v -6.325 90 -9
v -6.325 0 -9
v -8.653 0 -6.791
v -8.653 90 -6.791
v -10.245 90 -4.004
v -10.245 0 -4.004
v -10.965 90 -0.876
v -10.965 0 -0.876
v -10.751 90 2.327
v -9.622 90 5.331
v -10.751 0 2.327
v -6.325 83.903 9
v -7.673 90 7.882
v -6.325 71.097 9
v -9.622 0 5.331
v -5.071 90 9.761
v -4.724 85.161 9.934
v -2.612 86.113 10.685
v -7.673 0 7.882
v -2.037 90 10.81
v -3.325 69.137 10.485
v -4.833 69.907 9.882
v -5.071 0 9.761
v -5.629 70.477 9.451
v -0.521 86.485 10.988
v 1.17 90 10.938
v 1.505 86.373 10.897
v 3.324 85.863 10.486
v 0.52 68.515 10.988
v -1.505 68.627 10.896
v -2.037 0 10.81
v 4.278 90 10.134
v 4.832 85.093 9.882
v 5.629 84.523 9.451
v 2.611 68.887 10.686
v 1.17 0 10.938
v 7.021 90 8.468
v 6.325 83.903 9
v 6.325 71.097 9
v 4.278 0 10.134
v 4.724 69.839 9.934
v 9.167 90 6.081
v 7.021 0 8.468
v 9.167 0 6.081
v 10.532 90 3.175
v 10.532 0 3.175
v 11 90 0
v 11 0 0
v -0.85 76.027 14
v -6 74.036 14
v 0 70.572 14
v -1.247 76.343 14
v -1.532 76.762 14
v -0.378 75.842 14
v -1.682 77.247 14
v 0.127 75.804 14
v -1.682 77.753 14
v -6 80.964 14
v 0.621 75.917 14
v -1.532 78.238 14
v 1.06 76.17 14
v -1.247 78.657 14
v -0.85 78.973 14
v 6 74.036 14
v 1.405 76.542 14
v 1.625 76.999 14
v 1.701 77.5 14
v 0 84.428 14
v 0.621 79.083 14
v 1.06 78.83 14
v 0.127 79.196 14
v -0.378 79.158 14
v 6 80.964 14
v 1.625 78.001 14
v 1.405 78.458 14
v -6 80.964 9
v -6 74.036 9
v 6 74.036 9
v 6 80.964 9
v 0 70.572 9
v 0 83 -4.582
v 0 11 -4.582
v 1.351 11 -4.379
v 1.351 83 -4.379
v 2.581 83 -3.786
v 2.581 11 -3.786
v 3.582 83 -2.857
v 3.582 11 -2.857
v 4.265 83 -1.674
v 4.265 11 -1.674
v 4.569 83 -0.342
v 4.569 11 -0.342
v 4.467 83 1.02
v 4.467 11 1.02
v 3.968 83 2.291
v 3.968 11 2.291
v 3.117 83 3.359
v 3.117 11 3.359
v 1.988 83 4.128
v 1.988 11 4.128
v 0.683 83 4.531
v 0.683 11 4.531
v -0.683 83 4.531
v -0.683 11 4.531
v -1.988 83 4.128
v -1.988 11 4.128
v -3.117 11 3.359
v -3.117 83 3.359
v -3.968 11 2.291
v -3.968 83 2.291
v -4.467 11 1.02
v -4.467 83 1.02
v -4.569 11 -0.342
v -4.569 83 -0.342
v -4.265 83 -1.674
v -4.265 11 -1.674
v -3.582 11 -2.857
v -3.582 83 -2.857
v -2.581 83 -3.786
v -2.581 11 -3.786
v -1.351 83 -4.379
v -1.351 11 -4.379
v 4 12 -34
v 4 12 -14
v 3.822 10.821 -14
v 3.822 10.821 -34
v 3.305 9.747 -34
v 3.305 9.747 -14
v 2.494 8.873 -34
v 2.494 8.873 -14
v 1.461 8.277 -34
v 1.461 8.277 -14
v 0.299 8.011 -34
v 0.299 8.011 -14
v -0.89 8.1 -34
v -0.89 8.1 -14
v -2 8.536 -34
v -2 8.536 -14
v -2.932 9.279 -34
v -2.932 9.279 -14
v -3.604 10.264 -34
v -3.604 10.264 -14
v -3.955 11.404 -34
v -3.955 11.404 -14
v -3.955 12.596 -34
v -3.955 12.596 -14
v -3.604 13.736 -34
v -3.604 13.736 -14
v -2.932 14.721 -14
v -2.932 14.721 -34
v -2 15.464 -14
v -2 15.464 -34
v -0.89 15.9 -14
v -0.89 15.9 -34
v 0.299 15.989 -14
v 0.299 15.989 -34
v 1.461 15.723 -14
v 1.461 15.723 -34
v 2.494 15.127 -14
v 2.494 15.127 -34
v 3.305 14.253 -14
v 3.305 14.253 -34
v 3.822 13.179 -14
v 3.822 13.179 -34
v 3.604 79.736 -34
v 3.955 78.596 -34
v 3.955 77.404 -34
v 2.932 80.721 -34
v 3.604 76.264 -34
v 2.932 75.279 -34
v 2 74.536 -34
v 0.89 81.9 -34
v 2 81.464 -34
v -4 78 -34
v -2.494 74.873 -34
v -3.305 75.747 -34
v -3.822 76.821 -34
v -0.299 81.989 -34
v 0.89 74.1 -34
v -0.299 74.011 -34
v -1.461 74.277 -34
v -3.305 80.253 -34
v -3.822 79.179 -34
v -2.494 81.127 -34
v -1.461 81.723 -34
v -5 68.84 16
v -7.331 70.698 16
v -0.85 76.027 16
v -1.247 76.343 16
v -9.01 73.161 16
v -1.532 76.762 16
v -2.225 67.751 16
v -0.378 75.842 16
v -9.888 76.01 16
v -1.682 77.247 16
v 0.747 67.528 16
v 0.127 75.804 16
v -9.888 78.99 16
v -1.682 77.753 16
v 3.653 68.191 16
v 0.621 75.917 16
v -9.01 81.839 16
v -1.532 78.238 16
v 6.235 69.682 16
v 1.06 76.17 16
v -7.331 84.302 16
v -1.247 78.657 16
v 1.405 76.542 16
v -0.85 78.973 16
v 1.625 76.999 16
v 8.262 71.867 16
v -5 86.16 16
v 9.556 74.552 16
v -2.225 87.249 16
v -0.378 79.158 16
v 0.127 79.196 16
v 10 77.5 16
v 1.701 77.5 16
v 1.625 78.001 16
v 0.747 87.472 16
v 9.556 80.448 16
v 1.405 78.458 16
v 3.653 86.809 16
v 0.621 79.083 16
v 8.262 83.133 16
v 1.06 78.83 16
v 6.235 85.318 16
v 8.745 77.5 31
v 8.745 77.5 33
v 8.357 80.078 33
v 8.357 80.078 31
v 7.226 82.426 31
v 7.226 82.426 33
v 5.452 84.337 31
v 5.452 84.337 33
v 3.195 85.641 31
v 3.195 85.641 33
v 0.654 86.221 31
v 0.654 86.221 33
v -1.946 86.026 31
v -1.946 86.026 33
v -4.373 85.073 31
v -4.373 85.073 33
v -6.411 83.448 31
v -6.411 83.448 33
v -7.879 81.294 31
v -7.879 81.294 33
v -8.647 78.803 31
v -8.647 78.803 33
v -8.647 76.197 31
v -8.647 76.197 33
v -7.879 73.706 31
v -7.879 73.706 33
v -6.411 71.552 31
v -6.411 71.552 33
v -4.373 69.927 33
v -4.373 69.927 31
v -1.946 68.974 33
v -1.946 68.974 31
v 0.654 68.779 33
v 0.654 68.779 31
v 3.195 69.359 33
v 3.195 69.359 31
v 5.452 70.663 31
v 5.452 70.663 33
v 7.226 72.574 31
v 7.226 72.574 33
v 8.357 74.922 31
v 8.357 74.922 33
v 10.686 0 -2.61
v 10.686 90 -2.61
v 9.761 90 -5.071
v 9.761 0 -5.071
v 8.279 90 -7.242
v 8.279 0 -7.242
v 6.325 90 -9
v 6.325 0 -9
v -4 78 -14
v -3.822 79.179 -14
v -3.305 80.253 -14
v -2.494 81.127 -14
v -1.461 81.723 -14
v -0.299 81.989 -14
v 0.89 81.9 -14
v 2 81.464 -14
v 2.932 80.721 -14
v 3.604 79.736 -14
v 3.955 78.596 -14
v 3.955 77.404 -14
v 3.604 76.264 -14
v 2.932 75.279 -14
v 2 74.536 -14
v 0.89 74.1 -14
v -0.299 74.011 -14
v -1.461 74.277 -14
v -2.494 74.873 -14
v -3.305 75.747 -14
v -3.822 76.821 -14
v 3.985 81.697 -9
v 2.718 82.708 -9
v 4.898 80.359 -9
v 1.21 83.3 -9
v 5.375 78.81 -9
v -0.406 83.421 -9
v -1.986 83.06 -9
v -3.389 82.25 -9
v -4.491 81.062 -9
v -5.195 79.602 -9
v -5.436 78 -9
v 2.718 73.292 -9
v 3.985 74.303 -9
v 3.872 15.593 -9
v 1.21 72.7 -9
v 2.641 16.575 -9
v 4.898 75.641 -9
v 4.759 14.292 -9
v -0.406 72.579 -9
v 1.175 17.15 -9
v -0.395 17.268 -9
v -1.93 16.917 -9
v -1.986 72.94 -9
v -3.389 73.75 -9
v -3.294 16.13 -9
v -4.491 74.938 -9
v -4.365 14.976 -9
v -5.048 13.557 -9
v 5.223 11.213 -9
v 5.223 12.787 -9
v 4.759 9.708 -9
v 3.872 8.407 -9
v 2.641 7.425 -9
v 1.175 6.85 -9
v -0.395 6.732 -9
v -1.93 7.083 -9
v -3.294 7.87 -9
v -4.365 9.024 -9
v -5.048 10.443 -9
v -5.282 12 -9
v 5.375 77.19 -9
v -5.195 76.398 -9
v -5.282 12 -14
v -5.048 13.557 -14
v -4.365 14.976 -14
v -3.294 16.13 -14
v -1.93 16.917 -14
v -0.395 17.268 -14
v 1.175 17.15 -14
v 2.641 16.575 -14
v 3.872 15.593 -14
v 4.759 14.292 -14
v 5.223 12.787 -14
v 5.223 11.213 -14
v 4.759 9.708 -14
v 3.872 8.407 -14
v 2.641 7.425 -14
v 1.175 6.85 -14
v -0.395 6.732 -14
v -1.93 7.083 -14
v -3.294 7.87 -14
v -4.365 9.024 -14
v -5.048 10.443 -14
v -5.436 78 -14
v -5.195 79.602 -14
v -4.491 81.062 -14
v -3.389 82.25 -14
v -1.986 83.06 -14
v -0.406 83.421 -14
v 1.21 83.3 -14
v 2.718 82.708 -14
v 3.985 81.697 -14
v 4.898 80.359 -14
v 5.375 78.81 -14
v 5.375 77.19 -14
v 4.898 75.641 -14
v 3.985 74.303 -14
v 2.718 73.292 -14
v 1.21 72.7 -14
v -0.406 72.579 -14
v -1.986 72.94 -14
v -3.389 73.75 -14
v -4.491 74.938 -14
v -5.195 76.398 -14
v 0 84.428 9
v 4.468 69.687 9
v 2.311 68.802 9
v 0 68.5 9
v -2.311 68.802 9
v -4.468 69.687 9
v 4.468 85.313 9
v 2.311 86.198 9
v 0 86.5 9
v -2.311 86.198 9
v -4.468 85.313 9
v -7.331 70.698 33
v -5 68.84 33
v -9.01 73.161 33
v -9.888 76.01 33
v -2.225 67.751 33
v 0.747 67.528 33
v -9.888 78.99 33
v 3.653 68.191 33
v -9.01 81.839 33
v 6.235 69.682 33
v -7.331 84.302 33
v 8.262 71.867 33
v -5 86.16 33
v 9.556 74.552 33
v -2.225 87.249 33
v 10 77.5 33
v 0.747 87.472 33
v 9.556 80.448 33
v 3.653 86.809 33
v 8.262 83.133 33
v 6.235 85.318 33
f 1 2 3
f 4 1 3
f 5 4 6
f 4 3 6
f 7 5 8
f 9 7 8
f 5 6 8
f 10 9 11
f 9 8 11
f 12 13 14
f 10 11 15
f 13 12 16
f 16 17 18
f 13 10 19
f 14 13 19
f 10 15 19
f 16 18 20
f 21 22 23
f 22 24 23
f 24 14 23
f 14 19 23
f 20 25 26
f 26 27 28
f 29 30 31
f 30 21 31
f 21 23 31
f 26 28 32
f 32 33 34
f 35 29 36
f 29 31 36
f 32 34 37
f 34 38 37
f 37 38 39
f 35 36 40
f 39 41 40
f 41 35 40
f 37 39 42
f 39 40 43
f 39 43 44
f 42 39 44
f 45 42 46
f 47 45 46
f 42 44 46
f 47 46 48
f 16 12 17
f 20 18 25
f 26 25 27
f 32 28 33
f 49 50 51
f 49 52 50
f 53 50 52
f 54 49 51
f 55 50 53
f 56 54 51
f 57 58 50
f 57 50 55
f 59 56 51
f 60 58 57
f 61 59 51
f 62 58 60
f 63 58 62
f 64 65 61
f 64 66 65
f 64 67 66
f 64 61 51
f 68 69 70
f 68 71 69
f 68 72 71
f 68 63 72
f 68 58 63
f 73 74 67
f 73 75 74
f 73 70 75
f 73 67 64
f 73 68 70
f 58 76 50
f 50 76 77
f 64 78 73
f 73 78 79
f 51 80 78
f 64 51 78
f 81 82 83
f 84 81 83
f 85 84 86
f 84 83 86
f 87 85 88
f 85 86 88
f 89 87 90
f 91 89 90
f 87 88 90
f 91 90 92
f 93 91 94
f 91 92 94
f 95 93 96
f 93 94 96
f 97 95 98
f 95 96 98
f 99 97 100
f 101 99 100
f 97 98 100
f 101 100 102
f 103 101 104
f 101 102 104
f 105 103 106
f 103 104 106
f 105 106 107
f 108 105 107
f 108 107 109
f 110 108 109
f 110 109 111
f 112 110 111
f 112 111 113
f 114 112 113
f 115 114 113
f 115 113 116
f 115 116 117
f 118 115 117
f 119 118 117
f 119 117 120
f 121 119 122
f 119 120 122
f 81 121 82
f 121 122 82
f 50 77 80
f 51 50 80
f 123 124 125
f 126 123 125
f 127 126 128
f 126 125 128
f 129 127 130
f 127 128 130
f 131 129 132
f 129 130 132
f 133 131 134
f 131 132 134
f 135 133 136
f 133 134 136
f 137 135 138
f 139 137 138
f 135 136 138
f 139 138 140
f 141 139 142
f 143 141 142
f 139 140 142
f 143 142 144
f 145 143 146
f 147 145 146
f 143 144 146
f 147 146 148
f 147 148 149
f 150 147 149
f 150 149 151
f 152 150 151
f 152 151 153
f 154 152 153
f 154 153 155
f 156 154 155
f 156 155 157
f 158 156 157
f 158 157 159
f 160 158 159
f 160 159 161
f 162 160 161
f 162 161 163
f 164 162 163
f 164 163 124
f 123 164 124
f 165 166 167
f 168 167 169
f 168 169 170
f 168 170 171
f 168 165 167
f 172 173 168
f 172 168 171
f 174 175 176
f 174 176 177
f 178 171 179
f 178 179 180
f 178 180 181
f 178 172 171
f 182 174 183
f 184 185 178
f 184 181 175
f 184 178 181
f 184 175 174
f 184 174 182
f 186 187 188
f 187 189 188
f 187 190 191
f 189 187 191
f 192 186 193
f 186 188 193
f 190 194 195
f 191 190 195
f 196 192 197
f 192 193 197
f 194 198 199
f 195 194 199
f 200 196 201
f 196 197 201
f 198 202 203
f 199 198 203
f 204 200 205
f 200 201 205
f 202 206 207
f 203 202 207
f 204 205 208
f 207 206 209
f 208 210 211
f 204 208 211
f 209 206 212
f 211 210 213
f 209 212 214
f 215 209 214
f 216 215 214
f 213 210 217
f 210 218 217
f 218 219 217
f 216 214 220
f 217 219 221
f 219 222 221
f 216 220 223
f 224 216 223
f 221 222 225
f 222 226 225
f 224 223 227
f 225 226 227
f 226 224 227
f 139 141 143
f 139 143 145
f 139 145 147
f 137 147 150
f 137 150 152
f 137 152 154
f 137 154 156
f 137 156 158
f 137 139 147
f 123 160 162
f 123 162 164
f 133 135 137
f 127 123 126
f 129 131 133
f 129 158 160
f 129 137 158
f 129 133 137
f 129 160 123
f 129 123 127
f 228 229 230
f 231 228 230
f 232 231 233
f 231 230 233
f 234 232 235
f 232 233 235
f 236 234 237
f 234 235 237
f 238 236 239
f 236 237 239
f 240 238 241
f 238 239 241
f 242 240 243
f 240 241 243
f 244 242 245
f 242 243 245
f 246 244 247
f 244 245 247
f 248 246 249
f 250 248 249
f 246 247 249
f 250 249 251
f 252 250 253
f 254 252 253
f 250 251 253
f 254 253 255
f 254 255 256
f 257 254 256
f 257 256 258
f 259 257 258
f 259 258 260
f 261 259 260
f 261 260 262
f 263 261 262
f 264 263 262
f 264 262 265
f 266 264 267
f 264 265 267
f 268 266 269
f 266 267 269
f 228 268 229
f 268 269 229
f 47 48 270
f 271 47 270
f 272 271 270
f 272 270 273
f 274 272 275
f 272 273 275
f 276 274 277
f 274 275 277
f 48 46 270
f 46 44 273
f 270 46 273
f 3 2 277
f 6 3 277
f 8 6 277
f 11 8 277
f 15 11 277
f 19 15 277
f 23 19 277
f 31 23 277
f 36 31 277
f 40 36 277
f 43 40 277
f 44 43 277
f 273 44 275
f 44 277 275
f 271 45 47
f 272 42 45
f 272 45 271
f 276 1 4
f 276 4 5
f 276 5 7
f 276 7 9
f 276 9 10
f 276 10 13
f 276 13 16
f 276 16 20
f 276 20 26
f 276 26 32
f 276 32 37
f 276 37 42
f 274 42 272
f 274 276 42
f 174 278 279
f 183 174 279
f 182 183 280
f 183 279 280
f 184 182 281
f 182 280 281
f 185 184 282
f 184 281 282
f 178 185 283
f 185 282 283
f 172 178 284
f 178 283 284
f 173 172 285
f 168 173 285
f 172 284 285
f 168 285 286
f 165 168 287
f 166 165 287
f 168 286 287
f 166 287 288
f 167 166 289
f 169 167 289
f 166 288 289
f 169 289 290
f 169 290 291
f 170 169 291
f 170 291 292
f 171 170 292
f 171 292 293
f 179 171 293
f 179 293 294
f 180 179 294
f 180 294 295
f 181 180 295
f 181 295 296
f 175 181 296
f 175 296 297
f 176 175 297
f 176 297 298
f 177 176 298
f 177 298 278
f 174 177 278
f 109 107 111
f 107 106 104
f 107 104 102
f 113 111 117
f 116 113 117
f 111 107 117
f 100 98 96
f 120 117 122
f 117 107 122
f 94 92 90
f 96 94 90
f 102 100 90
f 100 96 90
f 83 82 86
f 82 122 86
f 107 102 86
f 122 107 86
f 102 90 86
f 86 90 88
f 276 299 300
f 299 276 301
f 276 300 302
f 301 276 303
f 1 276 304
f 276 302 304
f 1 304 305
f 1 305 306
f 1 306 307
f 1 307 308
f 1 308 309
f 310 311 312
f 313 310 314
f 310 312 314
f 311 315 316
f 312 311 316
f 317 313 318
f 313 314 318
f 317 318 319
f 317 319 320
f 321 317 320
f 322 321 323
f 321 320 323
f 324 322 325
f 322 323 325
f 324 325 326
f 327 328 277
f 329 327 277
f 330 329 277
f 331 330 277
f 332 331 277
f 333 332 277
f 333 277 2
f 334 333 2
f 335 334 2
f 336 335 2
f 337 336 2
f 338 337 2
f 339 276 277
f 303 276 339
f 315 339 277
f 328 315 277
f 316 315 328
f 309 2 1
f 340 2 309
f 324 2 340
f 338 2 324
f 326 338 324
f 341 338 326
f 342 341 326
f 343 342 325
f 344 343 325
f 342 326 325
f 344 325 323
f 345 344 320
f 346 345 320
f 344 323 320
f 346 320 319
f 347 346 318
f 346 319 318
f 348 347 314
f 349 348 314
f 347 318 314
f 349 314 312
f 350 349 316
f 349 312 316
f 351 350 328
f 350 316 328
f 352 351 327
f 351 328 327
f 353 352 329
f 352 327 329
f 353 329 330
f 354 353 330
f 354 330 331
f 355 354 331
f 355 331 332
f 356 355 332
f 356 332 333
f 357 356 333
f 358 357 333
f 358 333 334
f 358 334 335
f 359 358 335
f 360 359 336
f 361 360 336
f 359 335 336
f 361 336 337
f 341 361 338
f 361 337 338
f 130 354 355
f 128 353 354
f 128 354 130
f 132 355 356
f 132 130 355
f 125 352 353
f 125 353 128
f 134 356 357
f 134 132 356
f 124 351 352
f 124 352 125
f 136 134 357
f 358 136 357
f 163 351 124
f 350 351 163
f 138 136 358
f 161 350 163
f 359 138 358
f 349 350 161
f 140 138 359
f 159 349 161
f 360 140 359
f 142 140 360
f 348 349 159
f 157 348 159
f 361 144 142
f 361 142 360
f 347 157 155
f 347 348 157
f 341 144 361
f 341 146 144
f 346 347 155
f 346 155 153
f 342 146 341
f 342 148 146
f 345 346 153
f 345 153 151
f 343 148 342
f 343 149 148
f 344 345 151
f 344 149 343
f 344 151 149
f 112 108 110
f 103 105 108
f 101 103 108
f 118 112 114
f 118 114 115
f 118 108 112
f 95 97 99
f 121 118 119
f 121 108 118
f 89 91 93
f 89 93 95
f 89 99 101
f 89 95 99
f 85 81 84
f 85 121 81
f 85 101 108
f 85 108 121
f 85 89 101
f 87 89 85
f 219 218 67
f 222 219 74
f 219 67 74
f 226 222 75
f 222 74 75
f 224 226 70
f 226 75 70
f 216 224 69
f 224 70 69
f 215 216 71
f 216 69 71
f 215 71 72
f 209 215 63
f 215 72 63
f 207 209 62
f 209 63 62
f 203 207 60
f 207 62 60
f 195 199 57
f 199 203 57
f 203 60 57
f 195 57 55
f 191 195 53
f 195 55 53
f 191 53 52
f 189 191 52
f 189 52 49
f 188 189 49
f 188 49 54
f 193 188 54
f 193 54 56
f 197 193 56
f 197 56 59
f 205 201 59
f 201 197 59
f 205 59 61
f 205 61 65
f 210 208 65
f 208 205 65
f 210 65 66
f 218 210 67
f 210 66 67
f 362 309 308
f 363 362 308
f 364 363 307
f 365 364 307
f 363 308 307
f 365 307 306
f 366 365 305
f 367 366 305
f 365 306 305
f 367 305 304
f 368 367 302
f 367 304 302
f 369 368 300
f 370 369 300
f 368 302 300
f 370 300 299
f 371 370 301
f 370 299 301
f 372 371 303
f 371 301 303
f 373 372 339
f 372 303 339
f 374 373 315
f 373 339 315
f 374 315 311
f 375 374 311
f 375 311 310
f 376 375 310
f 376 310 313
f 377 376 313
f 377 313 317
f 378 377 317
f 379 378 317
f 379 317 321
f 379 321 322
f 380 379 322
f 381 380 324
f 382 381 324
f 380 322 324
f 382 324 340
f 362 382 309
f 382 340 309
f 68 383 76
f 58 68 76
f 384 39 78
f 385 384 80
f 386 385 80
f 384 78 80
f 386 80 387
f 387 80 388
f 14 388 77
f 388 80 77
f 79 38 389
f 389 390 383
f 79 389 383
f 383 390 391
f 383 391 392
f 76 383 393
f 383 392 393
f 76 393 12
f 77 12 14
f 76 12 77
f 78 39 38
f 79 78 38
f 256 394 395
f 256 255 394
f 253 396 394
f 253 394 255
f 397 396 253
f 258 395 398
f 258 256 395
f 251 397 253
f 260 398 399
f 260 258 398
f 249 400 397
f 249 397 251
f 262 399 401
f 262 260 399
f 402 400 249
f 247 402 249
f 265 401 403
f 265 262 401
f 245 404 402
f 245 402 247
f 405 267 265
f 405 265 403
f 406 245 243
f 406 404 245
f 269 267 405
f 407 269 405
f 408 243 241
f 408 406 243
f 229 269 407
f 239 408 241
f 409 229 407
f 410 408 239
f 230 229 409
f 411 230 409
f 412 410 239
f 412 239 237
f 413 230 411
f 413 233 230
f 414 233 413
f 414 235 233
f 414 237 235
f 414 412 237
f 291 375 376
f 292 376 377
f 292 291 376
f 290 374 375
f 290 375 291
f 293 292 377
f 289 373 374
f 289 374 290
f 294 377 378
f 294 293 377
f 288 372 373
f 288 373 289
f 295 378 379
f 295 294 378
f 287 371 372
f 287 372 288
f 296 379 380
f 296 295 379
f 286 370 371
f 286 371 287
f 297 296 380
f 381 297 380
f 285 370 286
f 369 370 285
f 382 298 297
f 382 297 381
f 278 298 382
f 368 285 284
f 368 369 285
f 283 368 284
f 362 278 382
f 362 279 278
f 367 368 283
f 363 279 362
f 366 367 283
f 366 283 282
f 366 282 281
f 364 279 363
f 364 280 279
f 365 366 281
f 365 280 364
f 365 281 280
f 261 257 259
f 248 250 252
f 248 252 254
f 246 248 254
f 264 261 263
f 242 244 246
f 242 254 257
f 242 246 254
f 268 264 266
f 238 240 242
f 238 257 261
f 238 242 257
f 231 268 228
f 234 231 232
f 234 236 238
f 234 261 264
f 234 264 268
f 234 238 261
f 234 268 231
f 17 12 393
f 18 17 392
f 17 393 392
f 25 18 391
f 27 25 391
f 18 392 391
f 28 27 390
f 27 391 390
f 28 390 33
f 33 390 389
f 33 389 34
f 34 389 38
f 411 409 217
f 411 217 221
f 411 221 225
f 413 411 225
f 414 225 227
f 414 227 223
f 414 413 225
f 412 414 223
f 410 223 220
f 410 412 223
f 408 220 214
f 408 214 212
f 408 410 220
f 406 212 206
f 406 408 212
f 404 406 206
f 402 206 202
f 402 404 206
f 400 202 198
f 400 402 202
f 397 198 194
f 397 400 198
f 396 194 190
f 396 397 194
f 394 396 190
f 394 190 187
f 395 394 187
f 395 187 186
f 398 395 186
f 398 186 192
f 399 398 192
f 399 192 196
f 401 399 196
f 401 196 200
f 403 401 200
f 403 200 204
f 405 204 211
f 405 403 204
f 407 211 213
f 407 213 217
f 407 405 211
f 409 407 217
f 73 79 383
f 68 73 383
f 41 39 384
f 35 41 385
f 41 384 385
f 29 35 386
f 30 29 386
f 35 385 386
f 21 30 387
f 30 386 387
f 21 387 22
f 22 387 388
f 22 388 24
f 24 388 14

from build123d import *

# Parameters (mm, degrees)
SALIENTE_EXTRUIR1_DEPTH = 90
CROQUIS3_R              = 9
CORTAR_EXTRUIR1_DEPTH   = 93.439169187
SALIENTE_EXTRUIR2_DEPTH = 5
CROQUIS5_R              = 1.700741298
SALIENTE_EXTRUIR3_DEPTH = 19
CROQUIS6_R              = 10
SALIENTE_EXTRUIR4_DEPTH = 17
CROQUIS7_R              = 8.745057349
CORTAR_EXTRUIR2_DEPTH   = 2
CROQUIS8_R              = 4.582163127
CORTAR_EXTRUIR3_DEPTH   = 72
CROQUIS9_R              = 4
SALIENTE_EXTRUIR5_DEPTH = 25
CROQUIS10_R             = 5.43607756
CROQUIS10_R_2           = 5.282430738
SALIENTE_EXTRUIR6_DEPTH = 5


with BuildPart() as part:
    # Croquis1 → Saliente-Extruir1 (new body)
    with BuildSketch(Plane(origin=(0, 0, 0), x_dir=(1, 0, 0), z_dir=(0, 1, 0))):
        with BuildLine():
            Line((6.32455532, 9), (-6.32455532, 9))
            ThreePointArc((-6.32455532, 9), (-5.070990607, -9.761406367), (11, 0))
            ThreePointArc((11, 0), (9.761406367, 5.070990607), (6.32455532, 9))
        make_face()
    extrude(amount=SALIENTE_EXTRUIR1_DEPTH)

    # Croquis3 → Cortar-Extruir1 (cut, through all)
    with BuildSketch(Plane(origin=(0, 0, 9), x_dir=(-1, 0, 0), z_dir=(0, 0, -1))):
        with Locations((0, 77.5)):
            Circle(CROQUIS3_R)
    extrude(amount=-CORTAR_EXTRUIR1_DEPTH, mode=Mode.SUBTRACT)

    # Croquis4 → Saliente-Extruir2 (add)
    with BuildSketch(Plane.XY.offset(9)):
        Polygon((0, 70.57179677), (6, 74.035898385), (6, 80.964101615), (0, 84.42820323), (-6, 80.964101615), (-6, 74.035898385), align=None)
    extrude(amount=SALIENTE_EXTRUIR2_DEPTH)

    # Croquis5 → Saliente-Extruir3 (add)
    with BuildSketch(Plane.XY.offset(14)):
        with Locations((0, 77.5)):
            Circle(CROQUIS5_R)
    extrude(amount=SALIENTE_EXTRUIR3_DEPTH)

    # Croquis6 → Saliente-Extruir4 (add)
    with BuildSketch(Plane.XY.offset(33)):
        with Locations((0, 77.5)):
            Circle(CROQUIS6_R)
    extrude(amount=-SALIENTE_EXTRUIR4_DEPTH)

    # Croquis7 → Cortar-Extruir2 (cut)
    with BuildSketch(Plane.XY.offset(33)):
        with Locations((0, 77.5)):
            Circle(CROQUIS7_R)
    extrude(amount=-CORTAR_EXTRUIR2_DEPTH, mode=Mode.SUBTRACT)

    # Croquis8 → Cortar-Extruir3 (cut)
    with BuildSketch(Plane(origin=(0, 11, 0), x_dir=(-1, 0, 0), z_dir=(0, -1, 0))):
        with Locations(Location((0, 0, 0), (0, 0, 90))):
            Circle(CROQUIS8_R)
    extrude(amount=-CORTAR_EXTRUIR3_DEPTH, mode=Mode.SUBTRACT)

    # Croquis9 → Saliente-Extruir5 (add)
    with BuildSketch(Plane(origin=(0, 0, -9), x_dir=(-1, 0, 0), z_dir=(0, 0, -1))):
        with Locations((0, 78)):
            Circle(CROQUIS9_R)
        with Locations(Location((0, 12, 0), (0, 0, 180))):
            Circle(CROQUIS9_R)
    extrude(amount=SALIENTE_EXTRUIR5_DEPTH)

    # Croquis10 → Saliente-Extruir6 (add)
    with BuildSketch(Plane(origin=(0, 0, -9), x_dir=(-1, 0, 0), z_dir=(0, 0, -1))):
        with Locations((0, 78)):
            Circle(CROQUIS10_R)
        with Locations((0, 12)):
            Circle(CROQUIS10_R_2)
    extrude(amount=SALIENTE_EXTRUIR6_DEPTH)


solid = part.part
